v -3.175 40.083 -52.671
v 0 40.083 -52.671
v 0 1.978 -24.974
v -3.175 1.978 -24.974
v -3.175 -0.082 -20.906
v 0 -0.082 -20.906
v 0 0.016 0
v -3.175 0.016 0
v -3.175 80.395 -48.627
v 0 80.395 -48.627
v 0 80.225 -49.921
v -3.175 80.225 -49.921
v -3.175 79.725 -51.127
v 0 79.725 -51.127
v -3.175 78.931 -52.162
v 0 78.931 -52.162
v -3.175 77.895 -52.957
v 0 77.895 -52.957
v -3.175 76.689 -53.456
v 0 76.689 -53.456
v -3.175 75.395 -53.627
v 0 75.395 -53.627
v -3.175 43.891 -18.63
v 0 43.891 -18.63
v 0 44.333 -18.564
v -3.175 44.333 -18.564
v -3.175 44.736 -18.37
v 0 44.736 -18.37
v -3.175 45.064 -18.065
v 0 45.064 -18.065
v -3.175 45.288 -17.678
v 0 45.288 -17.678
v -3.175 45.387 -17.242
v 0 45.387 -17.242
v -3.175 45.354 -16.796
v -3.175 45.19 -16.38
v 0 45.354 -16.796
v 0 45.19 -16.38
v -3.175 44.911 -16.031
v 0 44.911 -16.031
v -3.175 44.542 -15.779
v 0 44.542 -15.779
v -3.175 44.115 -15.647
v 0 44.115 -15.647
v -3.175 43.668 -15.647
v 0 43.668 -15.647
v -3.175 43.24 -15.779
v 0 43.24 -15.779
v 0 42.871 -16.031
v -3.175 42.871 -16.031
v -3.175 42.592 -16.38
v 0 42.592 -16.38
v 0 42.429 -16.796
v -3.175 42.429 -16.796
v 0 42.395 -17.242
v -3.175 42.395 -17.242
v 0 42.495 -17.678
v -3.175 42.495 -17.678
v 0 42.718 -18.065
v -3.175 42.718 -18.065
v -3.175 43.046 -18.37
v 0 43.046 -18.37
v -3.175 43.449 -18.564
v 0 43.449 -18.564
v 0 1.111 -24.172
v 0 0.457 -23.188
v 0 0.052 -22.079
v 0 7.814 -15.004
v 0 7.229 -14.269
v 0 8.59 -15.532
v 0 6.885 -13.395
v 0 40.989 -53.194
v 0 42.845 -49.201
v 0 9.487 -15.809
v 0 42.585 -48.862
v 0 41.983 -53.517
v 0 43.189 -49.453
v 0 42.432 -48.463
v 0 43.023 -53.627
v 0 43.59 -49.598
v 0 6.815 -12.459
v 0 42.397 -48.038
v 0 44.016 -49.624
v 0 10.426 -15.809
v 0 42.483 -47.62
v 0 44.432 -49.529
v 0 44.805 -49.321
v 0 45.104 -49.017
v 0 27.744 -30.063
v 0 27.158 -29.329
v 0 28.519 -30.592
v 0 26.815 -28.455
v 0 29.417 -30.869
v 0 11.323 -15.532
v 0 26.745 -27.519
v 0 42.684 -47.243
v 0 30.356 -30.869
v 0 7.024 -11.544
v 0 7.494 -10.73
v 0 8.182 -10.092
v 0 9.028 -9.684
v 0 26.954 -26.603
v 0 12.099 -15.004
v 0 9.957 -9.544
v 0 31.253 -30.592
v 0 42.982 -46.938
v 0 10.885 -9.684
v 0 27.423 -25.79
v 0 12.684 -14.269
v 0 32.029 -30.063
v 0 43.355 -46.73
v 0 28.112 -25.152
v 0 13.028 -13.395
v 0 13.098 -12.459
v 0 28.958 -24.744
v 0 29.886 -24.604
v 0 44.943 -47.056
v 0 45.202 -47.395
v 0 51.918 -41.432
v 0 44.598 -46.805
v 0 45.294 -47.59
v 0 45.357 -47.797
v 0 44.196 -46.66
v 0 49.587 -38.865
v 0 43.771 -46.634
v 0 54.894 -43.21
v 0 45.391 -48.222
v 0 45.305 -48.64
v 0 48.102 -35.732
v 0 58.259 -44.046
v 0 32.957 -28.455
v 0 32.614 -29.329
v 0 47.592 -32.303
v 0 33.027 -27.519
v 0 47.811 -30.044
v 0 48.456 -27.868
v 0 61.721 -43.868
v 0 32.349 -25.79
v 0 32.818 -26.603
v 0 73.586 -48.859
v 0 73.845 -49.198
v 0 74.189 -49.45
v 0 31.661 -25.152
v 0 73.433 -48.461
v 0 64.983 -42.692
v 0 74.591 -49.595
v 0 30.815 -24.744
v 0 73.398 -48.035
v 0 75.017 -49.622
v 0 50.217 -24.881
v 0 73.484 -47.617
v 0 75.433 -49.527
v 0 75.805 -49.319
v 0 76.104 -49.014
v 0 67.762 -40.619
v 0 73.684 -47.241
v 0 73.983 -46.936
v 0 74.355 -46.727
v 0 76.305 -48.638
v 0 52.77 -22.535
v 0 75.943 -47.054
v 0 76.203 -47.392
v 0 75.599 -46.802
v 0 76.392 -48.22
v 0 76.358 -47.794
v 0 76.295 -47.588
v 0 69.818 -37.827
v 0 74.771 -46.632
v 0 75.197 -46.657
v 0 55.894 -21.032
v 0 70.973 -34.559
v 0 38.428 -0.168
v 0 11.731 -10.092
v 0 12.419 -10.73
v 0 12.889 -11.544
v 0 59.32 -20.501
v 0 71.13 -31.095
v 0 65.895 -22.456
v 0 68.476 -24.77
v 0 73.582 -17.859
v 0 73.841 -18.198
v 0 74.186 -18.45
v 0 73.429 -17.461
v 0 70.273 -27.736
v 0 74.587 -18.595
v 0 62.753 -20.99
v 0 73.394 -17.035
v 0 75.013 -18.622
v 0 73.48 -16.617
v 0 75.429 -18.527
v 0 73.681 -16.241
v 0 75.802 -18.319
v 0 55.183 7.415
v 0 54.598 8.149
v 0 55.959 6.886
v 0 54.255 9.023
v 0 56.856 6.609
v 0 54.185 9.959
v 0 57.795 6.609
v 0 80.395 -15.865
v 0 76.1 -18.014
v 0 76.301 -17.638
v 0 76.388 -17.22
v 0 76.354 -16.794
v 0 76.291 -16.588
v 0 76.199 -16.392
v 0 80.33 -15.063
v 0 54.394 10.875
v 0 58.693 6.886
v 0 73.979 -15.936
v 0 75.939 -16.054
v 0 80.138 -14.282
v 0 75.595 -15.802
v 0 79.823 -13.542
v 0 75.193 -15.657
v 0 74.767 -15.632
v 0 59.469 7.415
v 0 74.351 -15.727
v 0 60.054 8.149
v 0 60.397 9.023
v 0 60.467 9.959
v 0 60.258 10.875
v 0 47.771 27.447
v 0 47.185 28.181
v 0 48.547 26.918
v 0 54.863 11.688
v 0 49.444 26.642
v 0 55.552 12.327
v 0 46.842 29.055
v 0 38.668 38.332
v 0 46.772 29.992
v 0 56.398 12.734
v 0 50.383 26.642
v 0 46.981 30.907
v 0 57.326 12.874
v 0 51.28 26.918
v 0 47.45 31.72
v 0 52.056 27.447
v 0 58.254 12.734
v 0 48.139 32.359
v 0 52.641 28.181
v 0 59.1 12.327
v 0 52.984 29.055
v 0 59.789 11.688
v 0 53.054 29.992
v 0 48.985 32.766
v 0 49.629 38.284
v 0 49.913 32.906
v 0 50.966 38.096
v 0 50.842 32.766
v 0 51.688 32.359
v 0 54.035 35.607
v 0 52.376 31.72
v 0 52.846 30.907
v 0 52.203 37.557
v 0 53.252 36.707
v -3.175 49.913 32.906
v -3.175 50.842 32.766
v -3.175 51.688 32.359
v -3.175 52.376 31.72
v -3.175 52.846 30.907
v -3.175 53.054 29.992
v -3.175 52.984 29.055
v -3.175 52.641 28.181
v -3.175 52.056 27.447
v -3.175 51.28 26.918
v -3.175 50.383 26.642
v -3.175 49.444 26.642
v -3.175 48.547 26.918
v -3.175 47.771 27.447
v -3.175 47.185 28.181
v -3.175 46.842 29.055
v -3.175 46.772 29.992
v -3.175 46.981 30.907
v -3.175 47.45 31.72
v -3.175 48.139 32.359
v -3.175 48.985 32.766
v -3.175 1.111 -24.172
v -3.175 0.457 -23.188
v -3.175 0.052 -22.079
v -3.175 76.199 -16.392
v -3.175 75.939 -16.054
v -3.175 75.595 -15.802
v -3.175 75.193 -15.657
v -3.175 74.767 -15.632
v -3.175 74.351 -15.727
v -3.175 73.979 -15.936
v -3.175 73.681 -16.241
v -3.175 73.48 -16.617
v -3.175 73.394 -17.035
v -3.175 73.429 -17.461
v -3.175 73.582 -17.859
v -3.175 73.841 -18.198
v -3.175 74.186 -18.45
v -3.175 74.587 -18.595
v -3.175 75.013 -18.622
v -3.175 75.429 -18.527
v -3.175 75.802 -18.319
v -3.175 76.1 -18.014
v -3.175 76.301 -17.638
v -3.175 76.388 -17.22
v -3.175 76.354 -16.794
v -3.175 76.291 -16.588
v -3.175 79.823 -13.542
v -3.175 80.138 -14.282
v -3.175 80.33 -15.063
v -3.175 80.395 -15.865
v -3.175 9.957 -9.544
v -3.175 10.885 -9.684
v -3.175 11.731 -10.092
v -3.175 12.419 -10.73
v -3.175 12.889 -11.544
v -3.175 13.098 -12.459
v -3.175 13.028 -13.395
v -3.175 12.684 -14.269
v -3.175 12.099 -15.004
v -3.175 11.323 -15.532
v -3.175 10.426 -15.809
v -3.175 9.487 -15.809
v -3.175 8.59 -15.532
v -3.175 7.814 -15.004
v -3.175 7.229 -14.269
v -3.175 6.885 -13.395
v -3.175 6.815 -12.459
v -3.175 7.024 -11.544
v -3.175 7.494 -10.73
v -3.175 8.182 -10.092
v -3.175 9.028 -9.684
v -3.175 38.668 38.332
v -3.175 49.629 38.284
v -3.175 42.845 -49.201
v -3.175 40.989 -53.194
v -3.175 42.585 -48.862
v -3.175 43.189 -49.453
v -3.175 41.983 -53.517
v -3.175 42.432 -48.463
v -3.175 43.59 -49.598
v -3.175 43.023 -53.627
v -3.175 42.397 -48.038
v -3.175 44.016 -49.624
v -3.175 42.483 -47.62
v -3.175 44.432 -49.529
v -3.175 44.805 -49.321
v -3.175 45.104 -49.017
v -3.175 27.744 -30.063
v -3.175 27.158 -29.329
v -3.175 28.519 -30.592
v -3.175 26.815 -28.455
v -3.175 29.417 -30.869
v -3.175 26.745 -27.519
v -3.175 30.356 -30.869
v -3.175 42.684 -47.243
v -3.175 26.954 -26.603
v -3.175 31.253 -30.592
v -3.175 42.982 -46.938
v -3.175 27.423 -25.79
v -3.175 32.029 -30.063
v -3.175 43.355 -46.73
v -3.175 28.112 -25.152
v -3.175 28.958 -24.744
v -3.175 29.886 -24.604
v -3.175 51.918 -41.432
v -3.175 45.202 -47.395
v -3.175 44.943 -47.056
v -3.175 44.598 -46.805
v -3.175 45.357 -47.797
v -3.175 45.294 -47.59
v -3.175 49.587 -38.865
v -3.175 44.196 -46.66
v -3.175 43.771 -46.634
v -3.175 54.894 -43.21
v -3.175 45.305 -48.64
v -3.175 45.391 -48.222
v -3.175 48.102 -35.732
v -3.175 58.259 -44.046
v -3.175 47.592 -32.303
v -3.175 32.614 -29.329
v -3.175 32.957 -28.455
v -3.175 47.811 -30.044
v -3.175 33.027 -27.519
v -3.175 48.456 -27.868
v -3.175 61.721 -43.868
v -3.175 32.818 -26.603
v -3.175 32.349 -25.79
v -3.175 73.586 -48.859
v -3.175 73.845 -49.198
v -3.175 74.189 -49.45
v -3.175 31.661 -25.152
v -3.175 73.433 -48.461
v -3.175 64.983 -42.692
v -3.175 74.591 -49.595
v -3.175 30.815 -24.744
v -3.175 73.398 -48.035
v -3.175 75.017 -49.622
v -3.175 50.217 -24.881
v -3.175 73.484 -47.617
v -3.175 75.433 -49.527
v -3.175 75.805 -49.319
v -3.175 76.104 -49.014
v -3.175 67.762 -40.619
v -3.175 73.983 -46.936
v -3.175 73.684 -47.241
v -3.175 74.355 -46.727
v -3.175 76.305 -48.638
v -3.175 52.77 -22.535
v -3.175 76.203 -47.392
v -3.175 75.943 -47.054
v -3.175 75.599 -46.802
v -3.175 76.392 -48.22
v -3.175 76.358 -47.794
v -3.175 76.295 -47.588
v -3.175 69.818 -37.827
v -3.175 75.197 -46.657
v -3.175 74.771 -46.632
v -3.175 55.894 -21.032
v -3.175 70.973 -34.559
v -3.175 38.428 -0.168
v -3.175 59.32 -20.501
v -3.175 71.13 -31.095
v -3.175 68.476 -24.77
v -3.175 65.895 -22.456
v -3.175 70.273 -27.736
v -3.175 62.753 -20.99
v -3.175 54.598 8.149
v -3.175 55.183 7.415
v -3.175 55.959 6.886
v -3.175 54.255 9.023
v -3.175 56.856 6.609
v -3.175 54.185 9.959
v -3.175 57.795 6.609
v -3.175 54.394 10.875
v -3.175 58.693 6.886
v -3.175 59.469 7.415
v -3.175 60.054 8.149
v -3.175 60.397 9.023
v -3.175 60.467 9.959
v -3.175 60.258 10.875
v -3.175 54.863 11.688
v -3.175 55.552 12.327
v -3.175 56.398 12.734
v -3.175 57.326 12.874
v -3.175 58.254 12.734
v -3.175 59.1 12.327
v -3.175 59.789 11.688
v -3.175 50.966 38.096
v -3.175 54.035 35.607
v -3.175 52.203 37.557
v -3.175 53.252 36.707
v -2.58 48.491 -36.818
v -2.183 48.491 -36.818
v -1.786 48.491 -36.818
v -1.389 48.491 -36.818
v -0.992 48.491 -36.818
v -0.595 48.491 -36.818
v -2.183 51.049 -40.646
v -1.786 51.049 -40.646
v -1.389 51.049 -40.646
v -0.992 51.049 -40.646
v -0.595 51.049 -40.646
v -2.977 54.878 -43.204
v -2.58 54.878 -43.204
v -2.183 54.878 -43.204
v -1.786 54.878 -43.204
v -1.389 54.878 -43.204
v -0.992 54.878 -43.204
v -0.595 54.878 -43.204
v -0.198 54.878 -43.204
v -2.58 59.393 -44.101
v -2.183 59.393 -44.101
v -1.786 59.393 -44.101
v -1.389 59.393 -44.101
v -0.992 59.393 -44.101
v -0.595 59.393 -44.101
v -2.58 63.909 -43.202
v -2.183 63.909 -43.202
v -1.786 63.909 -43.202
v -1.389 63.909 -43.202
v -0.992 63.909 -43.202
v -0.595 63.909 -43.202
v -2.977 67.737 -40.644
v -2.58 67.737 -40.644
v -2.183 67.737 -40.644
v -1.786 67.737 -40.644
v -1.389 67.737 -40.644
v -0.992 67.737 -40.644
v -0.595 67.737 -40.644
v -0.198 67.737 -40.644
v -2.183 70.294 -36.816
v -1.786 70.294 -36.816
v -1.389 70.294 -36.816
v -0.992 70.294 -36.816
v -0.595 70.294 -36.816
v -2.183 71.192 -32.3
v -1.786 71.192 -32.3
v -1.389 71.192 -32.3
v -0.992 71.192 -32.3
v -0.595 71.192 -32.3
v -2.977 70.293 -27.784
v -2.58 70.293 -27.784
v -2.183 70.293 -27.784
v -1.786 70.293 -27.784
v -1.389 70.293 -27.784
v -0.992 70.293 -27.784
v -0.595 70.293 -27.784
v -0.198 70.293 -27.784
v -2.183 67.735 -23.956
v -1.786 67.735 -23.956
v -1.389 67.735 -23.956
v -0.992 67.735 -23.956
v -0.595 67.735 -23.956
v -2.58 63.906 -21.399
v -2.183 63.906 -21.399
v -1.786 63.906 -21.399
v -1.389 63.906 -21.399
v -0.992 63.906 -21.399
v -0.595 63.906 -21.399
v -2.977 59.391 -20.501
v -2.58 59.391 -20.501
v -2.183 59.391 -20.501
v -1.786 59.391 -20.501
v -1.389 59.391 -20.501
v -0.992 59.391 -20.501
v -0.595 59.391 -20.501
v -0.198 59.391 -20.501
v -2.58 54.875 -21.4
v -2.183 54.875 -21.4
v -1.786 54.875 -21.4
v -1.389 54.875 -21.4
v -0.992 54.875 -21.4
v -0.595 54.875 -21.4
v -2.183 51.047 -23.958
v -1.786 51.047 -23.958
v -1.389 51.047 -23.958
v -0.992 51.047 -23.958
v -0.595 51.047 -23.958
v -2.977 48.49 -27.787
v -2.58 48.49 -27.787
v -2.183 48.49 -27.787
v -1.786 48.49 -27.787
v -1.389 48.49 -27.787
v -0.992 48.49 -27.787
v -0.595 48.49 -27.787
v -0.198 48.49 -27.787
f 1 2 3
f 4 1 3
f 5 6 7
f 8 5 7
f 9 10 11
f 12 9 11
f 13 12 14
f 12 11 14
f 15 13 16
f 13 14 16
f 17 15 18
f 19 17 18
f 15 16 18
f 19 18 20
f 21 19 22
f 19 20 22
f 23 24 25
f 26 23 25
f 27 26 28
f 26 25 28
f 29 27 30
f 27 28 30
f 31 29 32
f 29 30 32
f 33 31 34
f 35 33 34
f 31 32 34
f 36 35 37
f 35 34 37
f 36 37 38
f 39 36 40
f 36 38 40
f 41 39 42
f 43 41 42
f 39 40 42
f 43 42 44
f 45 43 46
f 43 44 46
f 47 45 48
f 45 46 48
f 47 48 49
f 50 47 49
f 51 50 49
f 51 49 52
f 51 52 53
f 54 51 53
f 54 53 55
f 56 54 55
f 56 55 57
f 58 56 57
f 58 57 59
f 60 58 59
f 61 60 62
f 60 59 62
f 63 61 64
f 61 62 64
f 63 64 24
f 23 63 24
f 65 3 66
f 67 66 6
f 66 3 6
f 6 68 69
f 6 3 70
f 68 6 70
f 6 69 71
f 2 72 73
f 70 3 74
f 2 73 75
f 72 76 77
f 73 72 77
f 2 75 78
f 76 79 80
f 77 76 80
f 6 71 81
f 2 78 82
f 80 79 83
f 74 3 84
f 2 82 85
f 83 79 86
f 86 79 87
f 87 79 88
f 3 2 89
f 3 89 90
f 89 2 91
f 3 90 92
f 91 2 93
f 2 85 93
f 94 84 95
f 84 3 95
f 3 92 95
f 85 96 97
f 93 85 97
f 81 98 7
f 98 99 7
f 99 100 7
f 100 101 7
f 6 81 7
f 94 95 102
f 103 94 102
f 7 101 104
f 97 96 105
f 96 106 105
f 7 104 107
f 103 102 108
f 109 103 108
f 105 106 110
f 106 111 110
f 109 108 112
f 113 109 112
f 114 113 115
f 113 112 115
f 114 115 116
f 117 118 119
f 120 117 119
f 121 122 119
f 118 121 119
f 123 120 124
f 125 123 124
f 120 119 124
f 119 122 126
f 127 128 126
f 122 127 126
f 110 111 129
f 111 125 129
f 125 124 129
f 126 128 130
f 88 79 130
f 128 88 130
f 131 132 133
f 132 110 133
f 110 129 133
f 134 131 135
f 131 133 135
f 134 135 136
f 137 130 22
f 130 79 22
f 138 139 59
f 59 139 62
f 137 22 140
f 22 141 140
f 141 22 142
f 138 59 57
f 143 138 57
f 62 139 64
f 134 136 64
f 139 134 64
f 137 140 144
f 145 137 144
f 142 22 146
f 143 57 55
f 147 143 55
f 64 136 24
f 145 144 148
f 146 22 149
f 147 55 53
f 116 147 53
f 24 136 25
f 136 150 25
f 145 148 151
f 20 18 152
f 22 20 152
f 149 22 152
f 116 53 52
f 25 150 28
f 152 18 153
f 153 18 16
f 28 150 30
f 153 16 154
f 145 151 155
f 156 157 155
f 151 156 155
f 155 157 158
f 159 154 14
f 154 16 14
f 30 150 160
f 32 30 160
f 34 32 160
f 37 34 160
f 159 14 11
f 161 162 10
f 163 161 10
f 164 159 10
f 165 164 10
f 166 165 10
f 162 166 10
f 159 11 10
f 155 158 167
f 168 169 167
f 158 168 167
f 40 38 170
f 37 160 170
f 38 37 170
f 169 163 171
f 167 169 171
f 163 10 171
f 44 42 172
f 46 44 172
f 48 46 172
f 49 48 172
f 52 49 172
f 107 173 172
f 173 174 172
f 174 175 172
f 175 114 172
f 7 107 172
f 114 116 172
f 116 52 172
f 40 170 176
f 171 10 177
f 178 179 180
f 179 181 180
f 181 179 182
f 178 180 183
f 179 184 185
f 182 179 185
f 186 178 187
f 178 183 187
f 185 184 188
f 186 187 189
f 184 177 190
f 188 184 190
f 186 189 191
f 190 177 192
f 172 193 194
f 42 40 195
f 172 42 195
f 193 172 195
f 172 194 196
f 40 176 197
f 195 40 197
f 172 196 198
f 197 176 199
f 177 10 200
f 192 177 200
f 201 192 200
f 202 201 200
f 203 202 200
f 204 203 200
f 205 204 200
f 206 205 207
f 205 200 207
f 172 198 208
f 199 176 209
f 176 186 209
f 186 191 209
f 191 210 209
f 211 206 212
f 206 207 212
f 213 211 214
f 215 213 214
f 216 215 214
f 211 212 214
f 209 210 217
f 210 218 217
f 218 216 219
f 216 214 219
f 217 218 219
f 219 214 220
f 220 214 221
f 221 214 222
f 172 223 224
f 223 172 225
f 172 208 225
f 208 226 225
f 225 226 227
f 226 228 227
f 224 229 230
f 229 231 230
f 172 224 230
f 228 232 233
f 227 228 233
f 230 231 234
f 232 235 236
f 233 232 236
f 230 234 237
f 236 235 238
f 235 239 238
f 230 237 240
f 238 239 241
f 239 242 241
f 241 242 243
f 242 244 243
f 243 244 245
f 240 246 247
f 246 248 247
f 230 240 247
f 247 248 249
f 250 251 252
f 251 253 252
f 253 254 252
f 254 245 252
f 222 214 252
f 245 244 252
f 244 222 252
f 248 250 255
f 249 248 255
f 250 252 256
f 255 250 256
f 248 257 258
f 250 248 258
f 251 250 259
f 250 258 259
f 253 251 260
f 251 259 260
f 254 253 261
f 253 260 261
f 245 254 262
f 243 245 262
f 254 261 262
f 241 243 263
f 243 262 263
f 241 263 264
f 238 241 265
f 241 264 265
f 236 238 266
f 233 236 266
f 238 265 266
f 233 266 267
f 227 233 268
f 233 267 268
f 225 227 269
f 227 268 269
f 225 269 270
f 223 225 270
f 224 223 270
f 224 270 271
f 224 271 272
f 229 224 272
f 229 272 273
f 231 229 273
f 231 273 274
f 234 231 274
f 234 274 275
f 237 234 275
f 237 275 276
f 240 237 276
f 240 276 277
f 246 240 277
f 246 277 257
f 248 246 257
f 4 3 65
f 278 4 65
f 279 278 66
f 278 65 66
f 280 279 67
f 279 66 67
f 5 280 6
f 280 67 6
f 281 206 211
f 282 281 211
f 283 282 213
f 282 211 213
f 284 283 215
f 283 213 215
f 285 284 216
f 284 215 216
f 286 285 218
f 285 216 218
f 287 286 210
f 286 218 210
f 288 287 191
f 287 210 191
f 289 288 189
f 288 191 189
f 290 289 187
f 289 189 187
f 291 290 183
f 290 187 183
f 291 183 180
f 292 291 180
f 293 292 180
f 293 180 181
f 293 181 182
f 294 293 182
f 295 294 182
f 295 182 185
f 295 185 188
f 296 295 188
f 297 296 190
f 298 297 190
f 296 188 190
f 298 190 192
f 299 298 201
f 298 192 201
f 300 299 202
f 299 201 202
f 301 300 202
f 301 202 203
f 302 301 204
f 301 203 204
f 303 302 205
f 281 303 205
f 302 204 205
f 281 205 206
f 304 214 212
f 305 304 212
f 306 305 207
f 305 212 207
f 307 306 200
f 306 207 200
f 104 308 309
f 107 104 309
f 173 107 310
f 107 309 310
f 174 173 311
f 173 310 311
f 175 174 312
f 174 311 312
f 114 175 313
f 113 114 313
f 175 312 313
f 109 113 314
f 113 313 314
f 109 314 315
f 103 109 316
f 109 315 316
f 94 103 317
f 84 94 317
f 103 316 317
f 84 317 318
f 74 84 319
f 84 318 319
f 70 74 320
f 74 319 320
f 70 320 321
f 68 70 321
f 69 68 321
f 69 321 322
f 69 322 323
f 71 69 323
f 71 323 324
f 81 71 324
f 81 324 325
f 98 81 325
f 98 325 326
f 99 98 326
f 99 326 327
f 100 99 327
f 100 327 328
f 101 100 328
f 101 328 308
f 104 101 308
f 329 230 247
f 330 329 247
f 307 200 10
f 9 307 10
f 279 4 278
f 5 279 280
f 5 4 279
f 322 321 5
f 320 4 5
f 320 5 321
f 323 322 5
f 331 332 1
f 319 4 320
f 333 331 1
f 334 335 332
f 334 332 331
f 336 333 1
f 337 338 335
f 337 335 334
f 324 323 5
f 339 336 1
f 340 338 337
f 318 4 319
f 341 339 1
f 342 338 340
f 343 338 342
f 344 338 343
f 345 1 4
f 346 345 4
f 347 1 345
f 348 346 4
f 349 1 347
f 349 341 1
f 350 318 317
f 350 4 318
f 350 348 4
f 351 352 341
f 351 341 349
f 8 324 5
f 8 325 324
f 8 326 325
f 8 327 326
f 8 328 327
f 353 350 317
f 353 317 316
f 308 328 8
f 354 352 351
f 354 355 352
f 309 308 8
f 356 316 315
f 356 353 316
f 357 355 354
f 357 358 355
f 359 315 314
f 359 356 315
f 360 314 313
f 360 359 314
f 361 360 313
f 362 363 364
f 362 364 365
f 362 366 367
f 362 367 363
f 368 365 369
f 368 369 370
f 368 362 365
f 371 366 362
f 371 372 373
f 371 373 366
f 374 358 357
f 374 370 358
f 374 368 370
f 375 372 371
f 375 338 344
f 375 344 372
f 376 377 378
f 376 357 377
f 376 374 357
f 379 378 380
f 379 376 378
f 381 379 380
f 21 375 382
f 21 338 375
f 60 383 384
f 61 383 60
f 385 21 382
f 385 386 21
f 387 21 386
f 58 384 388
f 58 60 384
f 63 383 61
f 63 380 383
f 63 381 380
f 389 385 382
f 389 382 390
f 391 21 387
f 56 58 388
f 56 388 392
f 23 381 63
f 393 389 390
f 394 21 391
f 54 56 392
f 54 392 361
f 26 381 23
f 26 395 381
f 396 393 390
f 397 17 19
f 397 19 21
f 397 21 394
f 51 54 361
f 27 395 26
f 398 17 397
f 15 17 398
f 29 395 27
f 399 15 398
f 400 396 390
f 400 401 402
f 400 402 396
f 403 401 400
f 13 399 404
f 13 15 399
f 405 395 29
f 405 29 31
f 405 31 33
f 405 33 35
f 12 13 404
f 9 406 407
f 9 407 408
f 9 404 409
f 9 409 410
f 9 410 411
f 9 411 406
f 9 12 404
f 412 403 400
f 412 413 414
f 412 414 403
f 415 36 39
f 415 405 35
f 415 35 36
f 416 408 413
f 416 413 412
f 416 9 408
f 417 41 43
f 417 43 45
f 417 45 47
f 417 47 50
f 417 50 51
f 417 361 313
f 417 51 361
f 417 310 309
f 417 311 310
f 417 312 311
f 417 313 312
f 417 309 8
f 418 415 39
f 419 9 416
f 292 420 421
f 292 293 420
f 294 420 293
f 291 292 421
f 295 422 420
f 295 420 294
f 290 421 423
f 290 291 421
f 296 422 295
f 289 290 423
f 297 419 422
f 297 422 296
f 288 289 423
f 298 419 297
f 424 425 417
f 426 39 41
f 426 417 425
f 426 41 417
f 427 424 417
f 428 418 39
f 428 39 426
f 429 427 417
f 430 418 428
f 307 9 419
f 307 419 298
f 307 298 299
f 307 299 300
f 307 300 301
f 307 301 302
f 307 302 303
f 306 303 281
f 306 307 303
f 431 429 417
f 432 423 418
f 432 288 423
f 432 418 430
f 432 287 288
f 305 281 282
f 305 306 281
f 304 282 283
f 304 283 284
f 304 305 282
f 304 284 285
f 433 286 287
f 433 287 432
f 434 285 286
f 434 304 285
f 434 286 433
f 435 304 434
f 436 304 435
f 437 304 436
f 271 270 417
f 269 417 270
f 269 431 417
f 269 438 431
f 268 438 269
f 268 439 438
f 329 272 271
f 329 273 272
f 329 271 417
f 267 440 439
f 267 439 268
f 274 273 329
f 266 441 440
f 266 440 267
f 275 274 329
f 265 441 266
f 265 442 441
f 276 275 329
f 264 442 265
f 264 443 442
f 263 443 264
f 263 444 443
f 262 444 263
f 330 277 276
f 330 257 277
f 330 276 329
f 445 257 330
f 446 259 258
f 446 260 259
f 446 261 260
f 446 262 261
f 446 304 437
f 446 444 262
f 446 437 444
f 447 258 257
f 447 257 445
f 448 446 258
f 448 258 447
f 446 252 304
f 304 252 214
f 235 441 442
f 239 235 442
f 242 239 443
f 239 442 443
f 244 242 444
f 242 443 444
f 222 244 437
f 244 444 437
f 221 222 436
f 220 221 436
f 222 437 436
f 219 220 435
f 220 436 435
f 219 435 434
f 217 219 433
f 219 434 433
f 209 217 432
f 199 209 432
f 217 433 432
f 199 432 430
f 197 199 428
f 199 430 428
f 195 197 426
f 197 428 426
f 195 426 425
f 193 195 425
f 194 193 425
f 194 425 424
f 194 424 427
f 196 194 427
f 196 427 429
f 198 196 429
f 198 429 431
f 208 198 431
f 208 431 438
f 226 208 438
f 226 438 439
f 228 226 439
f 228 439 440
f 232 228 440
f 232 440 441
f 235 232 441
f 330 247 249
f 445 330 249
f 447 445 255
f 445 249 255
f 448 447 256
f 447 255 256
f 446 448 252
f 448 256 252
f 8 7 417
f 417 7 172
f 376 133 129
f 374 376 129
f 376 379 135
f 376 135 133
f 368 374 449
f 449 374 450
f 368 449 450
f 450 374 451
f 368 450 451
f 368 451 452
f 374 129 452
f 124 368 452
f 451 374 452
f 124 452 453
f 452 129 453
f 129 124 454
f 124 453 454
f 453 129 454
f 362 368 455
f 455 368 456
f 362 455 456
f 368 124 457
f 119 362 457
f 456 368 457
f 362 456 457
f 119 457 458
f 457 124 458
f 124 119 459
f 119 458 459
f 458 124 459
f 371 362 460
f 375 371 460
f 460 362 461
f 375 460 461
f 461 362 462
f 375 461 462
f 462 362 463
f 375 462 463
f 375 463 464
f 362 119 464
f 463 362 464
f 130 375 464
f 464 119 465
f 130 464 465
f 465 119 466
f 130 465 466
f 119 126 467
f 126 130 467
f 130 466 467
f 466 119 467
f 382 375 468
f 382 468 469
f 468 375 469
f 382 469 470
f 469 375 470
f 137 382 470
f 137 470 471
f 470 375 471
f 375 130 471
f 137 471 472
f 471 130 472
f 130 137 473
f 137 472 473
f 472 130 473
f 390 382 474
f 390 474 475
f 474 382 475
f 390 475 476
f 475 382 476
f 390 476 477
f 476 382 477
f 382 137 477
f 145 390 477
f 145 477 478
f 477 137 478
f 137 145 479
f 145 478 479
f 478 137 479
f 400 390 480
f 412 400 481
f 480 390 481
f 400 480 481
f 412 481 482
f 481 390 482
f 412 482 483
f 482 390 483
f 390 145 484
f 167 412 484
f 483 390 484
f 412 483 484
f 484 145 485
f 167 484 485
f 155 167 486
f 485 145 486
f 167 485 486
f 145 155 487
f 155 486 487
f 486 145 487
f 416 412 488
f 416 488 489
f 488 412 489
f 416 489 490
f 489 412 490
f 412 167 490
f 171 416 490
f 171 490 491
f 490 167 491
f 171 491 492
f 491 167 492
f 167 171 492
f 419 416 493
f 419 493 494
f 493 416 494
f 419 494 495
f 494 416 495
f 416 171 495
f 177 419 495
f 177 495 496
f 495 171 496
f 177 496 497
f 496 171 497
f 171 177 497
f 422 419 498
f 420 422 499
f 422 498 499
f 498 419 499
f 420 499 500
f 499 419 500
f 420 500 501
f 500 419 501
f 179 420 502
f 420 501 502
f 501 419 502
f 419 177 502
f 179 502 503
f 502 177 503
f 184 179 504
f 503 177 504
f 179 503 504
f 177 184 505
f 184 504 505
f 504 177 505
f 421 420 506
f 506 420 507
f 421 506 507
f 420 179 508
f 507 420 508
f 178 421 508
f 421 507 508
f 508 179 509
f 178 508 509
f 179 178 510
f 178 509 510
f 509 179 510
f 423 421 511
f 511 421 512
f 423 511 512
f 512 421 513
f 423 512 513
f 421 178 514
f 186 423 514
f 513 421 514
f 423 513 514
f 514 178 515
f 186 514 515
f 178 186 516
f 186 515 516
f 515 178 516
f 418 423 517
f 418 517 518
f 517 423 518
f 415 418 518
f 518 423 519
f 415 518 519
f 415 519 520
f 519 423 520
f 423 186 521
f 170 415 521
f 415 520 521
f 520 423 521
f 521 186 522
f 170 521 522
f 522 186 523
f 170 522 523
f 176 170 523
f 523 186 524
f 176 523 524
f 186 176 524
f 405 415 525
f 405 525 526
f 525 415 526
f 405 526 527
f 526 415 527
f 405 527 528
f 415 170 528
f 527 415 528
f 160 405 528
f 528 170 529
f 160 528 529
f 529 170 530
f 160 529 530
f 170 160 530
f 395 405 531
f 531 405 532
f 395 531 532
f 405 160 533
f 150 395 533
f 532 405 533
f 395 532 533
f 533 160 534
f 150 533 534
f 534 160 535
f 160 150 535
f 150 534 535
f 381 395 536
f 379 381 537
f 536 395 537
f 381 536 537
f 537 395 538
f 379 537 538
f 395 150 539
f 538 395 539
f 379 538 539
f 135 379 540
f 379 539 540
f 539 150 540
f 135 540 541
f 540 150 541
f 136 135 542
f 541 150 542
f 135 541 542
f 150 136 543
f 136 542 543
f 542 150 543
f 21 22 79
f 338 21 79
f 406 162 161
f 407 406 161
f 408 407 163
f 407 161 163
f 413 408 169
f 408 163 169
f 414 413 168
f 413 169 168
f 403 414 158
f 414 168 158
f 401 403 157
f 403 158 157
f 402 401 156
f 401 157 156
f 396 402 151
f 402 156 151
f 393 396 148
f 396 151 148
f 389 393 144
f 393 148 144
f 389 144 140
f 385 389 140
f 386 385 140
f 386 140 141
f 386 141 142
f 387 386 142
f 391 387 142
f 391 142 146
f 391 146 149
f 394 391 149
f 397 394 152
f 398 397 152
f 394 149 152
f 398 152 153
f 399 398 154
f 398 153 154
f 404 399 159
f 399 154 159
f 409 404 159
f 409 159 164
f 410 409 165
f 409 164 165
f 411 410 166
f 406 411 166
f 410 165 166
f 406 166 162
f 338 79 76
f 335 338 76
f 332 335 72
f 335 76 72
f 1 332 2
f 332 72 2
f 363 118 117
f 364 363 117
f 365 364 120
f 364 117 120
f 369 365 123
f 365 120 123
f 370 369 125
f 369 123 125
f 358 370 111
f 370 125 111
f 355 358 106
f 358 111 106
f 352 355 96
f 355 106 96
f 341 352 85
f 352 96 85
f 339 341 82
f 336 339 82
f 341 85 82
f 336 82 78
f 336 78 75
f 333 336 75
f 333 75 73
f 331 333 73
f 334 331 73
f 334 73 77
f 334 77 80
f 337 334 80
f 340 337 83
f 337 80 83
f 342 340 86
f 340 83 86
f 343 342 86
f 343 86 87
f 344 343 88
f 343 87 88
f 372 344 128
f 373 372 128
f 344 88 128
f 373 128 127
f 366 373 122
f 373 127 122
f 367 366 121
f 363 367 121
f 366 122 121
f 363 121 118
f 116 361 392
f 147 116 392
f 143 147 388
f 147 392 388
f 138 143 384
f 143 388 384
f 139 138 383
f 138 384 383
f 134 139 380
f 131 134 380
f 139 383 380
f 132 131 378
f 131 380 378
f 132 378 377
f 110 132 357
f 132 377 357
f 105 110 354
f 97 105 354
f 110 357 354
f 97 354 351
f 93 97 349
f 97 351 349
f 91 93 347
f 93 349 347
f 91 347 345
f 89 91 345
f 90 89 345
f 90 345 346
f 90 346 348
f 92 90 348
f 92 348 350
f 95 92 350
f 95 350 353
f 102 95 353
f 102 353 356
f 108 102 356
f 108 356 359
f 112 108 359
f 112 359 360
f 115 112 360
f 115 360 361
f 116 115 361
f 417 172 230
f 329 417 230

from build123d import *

# Parameters (mm, degrees)
SKETCH1_R          = 1.5
SKETCH1_RX         = 1.5
SKETCH1_RY         = 1.499999958
BASE_FLANGE1_DEPTH = 3.175
SKETCH2_R          = 3.15
CUT_EXTRUDE1_DEPTH = 10


# Sheet-metal steps are written as plain solids
with BuildPart() as part:
    # Sketch1 → Base-Flange1 (new body)
    with BuildSketch(Plane(origin=(0, 0, 0), x_dir=(0, 0, -1), z_dir=(1, 0, 0))):
        with BuildLine():
            Line((15.865201272, 80.394978876), (48.626542571, 80.394978876))
            ThreePointArc((48.626542571, 80.394978876), (52.162076477, 78.930512782), (53.626542571, 75.394978876))
            Line((53.626542571, 75.394978876), (53.626542571, 43.023123453))
            ThreePointArc((53.626542571, 43.023123453), (53.381665801, 41.477548132), (52.671021343, 40.083363009))
            Line((52.671021343, 40.083363009), (24.97388681, 1.978056535))
            ThreePointArc((24.97388681, 1.978056535), (23.188445465, 0.457239672), (20.905954013, -0.082128012))
            Line((20.905954013, -0.082128012), (6.9504e-05, 0.015938493))
            Line((6.9504e-05, 0.015938493), (0.167574588, 38.427897973))
            Line((0.167574588, 38.427897973), (-38.331753926, 38.667513874))
            Line((-38.331753926, 38.667513874), (-38.283953708, 49.628972315))
            ThreePointArc((-38.283953708, 49.628972315), (-37.557098456, 52.203443057), (-35.60707457, 54.034733587))
            Line((-35.60707457, 54.034733587), (13.54212795, 79.822543708))
            ThreePointArc((13.54212795, 79.822543708), (14.668920402, 80.249761269), (15.865201272, 80.394978876))
        make_face()
        with Locations((17.130255889, 43.891226665)):
            Circle(SKETCH1_R, mode=Mode.SUBTRACT)
        with Locations(Location((48.129224581, 43.894326732), (0, 0, 119.309738267))):
            Ellipse(SKETCH1_RX, SKETCH1_RY, mode=Mode.SUBTRACT)
        with Locations(Location((17.126576602, 74.891226239), (0, 0, 119.309738267))):
            Ellipse(SKETCH1_RX, SKETCH1_RY, mode=Mode.SUBTRACT)
        with Locations(Location((48.126575725, 74.894904787), (0, 0, 119.309738267))):
            Ellipse(SKETCH1_RX, SKETCH1_RY, mode=Mode.SUBTRACT)
        with BuildLine():
            add(Edge.make_bspline(
                [(32.302616578, 47.592077565), (33.84702501, 47.592261157), (36.935768822, 48.207032249), (40.863315512, 50.83201062), (43.487359793, 54.760181559), (44.408414716, 59.393516648), (43.486258021, 64.026632625), (40.861279703, 67.954179586), (36.93310891, 70.578224108), (32.299774036, 71.499279195), (27.666658318, 70.577122557), (23.739111629, 67.952144186), (21.115067347, 64.023973247), (20.194012424, 59.390638157), (21.116169119, 54.75752218), (23.741147438, 50.82997522), (27.669318231, 48.205930698), (30.758208146, 47.591893973), (32.302616578, 47.592077565)],
                knots=[0, 0, 0, 0, 0.392699082, 0.785398163, 1.178097245, 1.570796327, 1.963495408, 2.35619449, 2.748893572, 3.141592654, 3.534291735, 3.926990817, 4.319689899, 4.71238898, 5.105088062, 5.497787144, 5.890486225, 6.283185307, 6.283185307, 6.283185307, 6.283185307], degree=3))
        make_face(mode=Mode.SUBTRACT)
    extrude(amount=-BASE_FLANGE1_DEPTH)

    # Sketch2 → Cut-Extrude1 (cut)
    with BuildSketch(Plane(origin=(-3.175, -854.244613751, -1311.587435239), x_dir=(0, 0, 1), z_dir=(-1, 0, 0))):
        with Locations((1283.833112159, 884.130691082)):
            Circle(SKETCH2_R)
        with Locations((1298.892990926, 864.201114773)):
            Circle(SKETCH2_R)
        with Locations((1341.343837435, 904.15787978)):
            Circle(SKETCH2_R)
        with Locations((1321.311357388, 911.570594384)):
            Circle(SKETCH2_R)
    extrude(amount=-CUT_EXTRUDE1_DEPTH, mode=Mode.SUBTRACT)


solid = part.part
